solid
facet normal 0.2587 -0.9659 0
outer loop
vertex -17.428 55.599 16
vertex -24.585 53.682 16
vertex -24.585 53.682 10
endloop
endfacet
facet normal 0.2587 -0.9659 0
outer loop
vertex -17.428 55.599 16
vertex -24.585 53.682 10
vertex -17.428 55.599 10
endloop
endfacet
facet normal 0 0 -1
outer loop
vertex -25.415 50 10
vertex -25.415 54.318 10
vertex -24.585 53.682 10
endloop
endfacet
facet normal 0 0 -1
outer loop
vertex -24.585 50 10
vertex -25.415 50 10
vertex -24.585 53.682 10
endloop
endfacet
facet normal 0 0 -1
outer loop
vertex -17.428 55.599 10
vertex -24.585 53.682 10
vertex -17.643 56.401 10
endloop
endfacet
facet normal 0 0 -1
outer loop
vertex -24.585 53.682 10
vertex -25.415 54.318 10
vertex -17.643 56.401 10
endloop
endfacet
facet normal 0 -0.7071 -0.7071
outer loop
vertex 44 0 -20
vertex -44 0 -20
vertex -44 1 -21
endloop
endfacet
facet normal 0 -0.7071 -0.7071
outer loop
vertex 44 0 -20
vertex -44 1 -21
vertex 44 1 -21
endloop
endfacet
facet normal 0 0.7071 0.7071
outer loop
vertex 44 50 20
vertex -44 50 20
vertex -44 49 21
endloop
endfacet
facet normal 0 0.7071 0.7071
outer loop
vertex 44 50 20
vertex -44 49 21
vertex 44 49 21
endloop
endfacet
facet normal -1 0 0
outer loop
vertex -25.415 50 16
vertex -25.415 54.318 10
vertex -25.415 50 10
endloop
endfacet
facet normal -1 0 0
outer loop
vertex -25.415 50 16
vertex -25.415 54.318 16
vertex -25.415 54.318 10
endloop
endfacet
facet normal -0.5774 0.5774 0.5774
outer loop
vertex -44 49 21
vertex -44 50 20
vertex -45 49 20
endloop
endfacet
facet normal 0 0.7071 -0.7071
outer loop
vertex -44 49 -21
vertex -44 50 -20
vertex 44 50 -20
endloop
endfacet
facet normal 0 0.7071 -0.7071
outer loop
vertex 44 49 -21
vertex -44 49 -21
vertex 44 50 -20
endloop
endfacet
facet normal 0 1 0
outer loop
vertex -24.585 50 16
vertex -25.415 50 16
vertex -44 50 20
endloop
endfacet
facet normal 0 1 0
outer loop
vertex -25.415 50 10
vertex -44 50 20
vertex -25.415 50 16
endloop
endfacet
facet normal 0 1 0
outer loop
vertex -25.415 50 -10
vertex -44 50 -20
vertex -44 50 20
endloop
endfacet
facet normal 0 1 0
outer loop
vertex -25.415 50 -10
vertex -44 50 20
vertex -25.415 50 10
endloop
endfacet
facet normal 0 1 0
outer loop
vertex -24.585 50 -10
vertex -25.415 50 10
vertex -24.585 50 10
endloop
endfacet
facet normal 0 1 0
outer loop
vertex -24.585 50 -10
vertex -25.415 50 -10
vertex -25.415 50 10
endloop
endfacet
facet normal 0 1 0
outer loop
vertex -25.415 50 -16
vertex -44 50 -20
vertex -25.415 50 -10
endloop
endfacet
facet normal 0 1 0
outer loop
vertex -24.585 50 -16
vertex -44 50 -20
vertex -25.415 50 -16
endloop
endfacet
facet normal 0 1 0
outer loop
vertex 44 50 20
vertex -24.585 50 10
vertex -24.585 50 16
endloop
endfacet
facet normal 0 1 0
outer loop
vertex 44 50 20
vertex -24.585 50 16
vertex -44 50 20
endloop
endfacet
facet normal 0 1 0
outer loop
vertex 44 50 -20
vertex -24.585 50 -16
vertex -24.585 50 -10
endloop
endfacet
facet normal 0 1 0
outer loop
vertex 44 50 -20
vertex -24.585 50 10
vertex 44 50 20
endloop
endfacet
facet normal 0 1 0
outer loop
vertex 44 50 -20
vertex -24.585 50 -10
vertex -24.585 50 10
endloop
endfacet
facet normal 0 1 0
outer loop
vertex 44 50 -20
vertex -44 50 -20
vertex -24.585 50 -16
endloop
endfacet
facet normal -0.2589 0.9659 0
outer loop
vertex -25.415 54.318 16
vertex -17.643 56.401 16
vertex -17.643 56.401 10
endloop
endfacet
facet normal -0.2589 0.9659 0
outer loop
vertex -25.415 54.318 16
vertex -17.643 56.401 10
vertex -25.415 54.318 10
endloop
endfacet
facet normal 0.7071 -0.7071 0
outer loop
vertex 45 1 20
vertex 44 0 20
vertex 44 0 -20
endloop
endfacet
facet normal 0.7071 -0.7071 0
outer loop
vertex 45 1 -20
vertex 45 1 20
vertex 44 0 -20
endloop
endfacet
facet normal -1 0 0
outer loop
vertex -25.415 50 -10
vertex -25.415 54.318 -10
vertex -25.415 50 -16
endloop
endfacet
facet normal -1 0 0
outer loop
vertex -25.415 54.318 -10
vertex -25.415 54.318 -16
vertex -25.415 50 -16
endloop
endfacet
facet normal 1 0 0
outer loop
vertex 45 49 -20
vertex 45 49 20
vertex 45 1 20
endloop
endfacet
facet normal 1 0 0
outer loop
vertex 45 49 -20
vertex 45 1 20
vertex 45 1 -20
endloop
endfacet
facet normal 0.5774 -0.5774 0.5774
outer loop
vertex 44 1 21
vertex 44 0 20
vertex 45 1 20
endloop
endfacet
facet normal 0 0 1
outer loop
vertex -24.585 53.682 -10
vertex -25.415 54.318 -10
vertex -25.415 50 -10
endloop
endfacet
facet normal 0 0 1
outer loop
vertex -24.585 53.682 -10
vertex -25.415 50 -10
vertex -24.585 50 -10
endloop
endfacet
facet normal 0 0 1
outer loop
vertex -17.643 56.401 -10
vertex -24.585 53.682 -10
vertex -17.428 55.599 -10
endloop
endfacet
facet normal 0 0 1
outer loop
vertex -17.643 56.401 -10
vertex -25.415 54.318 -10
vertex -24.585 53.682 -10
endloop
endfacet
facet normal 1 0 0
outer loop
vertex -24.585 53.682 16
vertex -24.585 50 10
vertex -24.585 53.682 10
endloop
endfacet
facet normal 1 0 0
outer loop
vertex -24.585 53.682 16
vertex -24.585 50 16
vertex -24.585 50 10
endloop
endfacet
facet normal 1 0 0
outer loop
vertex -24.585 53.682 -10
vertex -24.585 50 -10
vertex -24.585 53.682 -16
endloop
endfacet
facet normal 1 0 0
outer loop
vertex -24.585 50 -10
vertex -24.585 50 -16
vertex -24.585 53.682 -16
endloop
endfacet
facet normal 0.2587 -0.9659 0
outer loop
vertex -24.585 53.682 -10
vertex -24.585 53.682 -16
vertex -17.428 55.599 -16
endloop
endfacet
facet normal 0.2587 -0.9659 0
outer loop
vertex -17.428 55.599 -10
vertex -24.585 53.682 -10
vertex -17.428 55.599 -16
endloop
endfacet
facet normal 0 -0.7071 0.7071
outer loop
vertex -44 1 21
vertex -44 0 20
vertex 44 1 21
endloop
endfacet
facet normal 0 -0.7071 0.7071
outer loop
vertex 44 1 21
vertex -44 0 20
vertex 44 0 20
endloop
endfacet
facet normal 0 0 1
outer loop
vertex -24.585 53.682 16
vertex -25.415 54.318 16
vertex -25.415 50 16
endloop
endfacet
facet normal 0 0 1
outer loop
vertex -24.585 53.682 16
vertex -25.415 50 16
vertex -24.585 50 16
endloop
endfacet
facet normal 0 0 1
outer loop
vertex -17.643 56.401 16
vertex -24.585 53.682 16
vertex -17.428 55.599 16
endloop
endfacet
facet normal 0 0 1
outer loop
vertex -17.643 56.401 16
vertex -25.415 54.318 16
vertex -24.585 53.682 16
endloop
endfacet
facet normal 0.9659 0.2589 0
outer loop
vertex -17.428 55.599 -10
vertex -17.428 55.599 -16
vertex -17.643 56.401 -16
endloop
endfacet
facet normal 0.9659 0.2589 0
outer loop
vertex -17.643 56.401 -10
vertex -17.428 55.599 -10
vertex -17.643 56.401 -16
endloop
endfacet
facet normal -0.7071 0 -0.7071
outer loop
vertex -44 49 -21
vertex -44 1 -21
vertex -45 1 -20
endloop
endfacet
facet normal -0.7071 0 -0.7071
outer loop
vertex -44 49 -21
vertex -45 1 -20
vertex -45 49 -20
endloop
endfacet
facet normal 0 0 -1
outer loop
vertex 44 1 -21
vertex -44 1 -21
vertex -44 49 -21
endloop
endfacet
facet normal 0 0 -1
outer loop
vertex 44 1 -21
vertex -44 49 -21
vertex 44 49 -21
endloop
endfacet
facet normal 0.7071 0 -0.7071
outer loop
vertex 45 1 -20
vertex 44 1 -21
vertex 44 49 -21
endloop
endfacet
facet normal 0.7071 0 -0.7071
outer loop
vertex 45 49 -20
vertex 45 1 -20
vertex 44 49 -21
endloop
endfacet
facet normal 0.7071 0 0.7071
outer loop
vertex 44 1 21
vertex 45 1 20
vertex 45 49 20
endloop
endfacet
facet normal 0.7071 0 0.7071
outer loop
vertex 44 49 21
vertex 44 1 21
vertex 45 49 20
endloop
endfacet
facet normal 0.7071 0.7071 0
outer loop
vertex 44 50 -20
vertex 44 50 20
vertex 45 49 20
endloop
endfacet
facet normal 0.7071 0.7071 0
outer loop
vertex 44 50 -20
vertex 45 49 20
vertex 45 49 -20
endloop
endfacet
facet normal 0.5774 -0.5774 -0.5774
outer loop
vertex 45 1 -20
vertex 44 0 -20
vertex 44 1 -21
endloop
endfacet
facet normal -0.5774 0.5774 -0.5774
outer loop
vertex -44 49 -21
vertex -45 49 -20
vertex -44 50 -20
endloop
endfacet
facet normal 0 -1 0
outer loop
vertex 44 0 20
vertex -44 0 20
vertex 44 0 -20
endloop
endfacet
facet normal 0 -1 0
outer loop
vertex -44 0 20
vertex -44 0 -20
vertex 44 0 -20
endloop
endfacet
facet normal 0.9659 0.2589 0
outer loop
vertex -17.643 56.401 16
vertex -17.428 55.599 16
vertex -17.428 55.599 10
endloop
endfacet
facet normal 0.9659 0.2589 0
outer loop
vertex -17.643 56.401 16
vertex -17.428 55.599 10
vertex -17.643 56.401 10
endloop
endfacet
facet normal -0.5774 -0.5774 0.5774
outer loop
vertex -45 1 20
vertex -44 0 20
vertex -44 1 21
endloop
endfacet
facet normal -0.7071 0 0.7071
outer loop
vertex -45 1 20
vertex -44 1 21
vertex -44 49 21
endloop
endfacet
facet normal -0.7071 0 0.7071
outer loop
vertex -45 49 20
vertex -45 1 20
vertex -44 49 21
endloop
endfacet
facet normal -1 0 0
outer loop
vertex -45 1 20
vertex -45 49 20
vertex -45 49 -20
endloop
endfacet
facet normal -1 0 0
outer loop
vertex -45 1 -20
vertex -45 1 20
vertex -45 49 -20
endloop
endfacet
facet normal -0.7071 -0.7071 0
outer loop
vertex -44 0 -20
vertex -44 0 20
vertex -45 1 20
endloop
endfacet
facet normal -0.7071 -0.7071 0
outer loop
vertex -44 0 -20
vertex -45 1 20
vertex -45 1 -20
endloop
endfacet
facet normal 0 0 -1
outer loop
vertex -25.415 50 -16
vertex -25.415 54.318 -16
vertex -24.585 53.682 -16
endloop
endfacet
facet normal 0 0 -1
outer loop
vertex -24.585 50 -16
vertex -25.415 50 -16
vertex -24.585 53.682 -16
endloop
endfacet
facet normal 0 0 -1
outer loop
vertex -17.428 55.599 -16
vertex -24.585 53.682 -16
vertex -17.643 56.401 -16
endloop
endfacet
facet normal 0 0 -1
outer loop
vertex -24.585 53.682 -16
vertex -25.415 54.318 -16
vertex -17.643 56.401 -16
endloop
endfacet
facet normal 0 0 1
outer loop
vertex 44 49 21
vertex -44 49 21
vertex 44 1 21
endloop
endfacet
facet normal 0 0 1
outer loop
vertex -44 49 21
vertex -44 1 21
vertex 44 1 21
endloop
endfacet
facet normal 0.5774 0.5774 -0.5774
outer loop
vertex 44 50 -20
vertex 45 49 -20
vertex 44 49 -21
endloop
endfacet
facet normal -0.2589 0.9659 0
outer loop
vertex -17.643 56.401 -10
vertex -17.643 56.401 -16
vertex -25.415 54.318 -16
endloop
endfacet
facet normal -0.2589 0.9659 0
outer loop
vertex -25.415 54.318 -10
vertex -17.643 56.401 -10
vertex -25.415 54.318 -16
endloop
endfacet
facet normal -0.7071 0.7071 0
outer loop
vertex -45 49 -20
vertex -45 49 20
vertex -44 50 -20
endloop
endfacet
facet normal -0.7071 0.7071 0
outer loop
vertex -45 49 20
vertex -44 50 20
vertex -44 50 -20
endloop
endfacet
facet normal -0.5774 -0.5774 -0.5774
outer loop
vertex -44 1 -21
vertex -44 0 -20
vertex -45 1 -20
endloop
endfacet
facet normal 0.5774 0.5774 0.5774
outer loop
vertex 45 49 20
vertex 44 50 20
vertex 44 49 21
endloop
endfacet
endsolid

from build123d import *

# Parameters (mm, degrees)
ESQUISSE2_W        = 90
ESQUISSE2_H        = 42
BOSS_EXTRU_1_DEPTH = 50
CHANFREIN1_SIZE    = 1
EXTRU_MINCE1_DEPTH = 3


with BuildPart() as part:
    # Esquisse2 → Boss.-Extru.1 (new body)
    with BuildSketch(Plane(origin=(0, 0, 0), x_dir=(1, 0, 0), z_dir=(0, 1, 0))):
        Rectangle(ESQUISSE2_W, ESQUISSE2_H)
    extrude(amount=BOSS_EXTRU_1_DEPTH)

    # Chanfrein1
    chanfrein1_edges = [part.edges().sort_by_distance(p)[0] for p in [
        (-45, 50, 0),
        (0, 50, 21),
        (45, 50, 0),
        (0, 0, 21),
        (-45, 0, 0),
        (0, 0, -21),
        (45, 0, 0),
        (45, 25, 21),
        (-45, 25, 21),
        (-45, 25, -21),
        (45, 25, -21),
        (0, 50, -21),
    ]]
    chamfer(chanfrein1_edges, length=CHANFREIN1_SIZE)

    # Esquisse5 → Extru.-Mince1 (add, symmetric)
    with BuildSketch(Plane.XY.offset(13)):
        Polygon((-24.585, 50), (-24.585, 53.6815593), (-17.428488481, 55.599140782), (-17.643308289, 56.400859218), (-25.415, 54.3184407), (-25.415, 50), align=None)
    extru_mince1 = extrude(amount=EXTRU_MINCE1_DEPTH, both=True)

    # Symétrie1: Extru.-Mince1 across plane
    add(extru_mince1.mirror(Plane.XY))


solid = part.part
